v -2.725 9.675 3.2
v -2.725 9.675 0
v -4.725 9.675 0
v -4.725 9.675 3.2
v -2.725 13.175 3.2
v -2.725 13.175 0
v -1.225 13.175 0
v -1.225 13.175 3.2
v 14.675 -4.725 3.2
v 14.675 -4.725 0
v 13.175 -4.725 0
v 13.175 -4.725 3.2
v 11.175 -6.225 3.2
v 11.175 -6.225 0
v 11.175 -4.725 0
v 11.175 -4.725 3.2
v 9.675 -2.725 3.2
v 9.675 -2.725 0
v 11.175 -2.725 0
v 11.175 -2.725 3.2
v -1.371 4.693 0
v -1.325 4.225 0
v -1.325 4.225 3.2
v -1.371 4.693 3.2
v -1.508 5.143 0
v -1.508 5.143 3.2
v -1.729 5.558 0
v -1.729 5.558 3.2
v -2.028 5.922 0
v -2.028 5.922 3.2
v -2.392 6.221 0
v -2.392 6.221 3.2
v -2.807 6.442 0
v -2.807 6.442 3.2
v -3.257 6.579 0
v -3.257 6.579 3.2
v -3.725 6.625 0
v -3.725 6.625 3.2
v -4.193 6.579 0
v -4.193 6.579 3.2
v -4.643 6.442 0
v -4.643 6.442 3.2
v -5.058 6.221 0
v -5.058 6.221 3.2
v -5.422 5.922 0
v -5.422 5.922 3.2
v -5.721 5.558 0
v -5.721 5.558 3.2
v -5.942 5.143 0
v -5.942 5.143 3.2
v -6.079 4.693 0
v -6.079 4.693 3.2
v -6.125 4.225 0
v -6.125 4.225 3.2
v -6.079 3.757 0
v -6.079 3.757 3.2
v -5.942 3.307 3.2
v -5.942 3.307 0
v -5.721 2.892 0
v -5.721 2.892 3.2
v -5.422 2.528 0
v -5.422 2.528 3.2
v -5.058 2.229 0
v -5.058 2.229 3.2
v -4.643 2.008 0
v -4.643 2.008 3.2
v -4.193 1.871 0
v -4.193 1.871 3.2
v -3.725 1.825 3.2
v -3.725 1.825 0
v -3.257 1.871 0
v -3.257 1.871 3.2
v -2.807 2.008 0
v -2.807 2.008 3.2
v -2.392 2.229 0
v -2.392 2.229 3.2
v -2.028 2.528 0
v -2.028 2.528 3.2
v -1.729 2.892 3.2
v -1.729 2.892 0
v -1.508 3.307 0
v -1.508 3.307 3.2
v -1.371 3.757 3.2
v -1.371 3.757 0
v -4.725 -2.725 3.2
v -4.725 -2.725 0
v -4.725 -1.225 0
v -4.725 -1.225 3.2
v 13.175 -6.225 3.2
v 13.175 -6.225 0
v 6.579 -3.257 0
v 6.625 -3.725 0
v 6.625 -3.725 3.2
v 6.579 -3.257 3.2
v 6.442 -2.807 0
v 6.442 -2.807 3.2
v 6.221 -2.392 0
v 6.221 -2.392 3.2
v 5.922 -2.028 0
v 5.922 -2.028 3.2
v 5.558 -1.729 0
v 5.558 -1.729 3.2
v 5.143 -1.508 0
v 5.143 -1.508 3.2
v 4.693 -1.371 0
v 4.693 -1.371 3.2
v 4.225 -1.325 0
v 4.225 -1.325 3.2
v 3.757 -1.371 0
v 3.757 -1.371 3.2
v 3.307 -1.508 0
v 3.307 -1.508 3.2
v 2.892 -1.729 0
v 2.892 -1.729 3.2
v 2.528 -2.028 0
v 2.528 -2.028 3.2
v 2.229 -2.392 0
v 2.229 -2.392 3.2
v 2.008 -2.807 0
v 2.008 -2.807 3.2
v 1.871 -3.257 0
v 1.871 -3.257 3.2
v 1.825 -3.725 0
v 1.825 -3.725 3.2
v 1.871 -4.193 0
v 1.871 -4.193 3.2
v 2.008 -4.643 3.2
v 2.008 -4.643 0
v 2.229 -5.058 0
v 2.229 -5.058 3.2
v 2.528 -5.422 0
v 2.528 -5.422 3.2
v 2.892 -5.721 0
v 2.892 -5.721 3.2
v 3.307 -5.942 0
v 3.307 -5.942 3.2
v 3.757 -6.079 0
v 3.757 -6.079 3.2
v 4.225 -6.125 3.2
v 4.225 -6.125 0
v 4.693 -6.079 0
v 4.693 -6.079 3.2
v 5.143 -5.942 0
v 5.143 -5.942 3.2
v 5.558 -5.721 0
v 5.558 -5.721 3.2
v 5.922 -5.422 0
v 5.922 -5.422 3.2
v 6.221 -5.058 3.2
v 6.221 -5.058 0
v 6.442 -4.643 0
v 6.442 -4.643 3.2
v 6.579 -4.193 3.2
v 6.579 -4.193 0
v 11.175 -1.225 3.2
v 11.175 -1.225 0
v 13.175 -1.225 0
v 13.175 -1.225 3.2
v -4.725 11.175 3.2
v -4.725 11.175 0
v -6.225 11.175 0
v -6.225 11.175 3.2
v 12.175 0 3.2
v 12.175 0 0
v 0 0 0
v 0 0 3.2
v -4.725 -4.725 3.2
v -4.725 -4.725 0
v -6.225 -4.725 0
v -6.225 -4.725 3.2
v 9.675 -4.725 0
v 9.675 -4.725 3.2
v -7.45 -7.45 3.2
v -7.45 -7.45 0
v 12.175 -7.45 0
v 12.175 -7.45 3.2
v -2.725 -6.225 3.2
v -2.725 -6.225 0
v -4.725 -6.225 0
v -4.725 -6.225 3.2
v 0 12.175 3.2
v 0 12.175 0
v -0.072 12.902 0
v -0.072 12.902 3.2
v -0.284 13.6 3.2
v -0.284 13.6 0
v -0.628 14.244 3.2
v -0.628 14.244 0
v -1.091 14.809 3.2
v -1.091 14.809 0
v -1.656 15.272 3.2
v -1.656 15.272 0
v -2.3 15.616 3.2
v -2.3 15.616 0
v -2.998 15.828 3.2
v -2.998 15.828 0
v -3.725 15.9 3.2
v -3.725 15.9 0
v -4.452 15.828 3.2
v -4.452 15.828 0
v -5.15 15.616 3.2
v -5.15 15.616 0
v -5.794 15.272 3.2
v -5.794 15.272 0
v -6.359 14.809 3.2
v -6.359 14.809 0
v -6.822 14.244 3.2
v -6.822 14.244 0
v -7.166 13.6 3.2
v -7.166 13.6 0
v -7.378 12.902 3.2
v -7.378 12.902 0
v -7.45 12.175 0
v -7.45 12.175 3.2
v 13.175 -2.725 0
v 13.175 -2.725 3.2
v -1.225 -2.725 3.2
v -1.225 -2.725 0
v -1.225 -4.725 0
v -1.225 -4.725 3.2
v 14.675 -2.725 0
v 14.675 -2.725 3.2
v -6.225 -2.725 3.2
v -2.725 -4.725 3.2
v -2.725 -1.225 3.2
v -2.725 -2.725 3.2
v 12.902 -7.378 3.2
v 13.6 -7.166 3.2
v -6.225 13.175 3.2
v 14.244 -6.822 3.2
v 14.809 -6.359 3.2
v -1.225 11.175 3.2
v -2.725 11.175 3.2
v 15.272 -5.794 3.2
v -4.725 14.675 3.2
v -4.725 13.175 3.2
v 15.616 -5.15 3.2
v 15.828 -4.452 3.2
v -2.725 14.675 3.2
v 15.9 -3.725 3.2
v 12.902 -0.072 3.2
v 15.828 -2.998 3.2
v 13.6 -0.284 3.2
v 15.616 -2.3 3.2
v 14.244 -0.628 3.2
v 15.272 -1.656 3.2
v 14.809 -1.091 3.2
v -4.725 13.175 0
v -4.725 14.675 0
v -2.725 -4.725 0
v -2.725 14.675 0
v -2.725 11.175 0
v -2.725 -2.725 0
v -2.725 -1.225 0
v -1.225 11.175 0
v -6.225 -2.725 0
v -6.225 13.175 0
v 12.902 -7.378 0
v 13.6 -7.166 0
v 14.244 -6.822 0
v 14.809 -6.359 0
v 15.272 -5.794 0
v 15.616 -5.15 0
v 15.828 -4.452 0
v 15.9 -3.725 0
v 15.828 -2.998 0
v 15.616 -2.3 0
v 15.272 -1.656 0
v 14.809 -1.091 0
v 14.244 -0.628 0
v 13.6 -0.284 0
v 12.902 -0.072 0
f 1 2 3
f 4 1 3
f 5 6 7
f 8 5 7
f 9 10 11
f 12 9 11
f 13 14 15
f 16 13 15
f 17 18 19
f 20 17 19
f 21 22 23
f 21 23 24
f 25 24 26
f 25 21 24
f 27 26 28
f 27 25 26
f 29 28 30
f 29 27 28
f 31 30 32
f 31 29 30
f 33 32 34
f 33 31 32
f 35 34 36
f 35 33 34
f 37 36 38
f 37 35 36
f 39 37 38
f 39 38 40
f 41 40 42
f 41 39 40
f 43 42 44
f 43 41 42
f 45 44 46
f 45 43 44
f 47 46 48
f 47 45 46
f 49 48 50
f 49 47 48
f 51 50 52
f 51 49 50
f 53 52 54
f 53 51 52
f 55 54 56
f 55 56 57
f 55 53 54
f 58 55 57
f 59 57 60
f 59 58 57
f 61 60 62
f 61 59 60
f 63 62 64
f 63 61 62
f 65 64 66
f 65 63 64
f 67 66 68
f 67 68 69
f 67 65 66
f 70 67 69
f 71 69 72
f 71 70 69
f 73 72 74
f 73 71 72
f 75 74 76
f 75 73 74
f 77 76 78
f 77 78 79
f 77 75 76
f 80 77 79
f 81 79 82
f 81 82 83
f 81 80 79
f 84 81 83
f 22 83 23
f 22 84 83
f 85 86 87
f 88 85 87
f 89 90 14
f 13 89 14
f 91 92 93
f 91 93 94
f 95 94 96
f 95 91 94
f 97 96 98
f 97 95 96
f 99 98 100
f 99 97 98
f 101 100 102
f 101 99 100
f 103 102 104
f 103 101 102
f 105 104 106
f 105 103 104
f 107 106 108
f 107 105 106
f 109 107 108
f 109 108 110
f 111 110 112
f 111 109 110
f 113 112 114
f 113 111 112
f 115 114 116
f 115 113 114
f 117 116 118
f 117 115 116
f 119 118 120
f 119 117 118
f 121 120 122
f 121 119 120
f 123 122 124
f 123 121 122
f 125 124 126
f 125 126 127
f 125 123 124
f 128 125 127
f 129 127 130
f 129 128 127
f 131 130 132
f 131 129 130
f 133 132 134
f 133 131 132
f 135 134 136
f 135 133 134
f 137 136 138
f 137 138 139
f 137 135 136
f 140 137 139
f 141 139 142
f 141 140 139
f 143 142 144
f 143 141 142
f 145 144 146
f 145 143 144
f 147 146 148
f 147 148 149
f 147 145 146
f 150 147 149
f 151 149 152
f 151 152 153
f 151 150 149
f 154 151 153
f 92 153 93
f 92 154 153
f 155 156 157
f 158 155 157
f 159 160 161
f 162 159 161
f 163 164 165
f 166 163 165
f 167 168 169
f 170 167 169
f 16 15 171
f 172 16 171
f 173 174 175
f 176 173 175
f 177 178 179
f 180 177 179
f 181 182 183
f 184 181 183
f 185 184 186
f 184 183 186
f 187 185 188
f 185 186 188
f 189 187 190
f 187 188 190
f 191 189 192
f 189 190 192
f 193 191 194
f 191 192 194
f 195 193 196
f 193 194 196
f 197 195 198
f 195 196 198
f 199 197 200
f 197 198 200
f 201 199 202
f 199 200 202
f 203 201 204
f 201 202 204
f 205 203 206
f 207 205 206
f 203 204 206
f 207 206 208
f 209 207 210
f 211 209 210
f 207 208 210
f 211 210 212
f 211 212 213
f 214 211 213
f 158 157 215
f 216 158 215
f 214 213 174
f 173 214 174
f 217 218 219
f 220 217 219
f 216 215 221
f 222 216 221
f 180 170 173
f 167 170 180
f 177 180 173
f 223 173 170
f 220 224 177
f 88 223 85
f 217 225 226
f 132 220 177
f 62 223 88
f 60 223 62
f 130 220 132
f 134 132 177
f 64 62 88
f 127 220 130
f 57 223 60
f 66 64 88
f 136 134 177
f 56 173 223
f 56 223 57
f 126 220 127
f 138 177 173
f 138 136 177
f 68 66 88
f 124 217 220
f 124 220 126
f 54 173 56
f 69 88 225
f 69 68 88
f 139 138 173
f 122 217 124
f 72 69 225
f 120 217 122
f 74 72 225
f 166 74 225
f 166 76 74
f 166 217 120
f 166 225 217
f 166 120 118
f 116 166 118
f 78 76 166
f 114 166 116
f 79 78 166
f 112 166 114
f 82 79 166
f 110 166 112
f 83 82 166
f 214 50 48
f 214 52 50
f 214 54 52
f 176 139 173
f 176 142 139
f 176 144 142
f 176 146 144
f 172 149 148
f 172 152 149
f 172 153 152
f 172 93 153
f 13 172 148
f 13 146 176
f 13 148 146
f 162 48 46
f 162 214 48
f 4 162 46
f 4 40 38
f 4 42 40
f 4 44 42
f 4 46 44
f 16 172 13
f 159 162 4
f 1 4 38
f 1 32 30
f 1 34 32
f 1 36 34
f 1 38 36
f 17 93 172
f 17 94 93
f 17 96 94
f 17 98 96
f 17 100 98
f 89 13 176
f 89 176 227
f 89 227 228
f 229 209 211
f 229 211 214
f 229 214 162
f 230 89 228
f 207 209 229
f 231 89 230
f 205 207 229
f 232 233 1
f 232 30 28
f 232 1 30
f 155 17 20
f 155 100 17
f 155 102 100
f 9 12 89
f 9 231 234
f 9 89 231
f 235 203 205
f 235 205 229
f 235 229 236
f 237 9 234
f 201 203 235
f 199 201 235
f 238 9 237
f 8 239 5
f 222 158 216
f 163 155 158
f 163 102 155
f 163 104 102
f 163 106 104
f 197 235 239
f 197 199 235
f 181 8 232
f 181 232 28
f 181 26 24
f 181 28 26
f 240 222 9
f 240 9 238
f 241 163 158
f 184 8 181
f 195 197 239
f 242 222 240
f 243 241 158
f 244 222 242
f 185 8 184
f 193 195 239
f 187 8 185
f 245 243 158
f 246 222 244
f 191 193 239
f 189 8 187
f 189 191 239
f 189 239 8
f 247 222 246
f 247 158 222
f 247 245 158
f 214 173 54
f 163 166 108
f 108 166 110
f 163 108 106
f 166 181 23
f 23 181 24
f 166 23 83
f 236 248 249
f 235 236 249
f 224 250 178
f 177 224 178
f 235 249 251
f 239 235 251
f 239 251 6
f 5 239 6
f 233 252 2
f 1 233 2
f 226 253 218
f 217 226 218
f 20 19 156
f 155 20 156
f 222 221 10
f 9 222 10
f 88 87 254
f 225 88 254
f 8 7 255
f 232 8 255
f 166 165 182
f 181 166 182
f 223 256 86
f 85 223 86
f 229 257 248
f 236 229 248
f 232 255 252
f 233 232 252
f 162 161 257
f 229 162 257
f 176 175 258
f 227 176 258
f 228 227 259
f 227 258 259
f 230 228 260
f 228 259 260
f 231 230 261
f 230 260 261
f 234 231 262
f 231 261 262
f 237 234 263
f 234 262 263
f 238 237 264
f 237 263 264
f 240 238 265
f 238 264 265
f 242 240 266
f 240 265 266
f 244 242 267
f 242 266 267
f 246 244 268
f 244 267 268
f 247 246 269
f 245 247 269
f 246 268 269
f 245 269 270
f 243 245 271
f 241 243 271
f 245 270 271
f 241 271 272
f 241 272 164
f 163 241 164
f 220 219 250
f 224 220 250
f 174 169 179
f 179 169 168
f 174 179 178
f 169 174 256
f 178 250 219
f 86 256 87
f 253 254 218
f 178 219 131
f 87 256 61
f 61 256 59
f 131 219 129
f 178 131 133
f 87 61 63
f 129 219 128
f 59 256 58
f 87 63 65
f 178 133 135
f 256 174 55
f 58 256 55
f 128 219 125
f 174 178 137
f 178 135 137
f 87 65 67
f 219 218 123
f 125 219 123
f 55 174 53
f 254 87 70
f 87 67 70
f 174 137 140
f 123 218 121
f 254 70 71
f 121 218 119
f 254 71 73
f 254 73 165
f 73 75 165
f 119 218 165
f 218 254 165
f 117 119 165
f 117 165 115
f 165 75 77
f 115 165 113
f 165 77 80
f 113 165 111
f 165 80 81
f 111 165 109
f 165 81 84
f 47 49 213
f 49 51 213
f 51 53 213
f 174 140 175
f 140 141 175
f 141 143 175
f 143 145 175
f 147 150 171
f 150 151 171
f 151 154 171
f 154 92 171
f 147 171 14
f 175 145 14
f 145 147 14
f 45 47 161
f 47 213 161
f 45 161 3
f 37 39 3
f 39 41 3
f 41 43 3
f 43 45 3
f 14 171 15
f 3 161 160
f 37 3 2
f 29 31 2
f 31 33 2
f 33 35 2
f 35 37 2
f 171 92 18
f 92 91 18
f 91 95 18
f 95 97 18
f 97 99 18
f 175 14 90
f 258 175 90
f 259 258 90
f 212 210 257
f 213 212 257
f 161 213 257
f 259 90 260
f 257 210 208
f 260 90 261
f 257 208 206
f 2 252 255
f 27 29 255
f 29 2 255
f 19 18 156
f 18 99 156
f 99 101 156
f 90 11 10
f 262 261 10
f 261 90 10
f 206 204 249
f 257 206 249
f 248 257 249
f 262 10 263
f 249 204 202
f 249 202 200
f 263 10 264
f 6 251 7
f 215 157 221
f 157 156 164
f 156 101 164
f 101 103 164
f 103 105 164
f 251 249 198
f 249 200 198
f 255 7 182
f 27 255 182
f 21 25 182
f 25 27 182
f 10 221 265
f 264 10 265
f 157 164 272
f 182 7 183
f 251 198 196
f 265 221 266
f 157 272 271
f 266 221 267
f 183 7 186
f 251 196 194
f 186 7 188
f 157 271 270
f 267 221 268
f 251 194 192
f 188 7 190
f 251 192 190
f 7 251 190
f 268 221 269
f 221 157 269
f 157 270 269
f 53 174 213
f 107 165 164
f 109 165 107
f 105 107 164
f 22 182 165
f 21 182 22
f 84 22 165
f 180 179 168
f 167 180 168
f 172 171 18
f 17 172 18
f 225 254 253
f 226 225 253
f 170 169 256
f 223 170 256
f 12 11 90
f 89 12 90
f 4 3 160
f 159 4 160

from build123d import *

# Parameters (mm, degrees)
F0_R     = 2.4
F1_DEPTH = 3.2


with BuildPart() as f1:
    # F0 (on Top) → F1 (new body)
    with BuildSketch(Plane.XY):
        with BuildLine():
            ThreePointArc((0, 12.175), (-3.725, 15.9), (-7.45, 12.175))
            Line((-7.45, 12.175), (-7.45, -7.45))
            Line((-7.45, -7.45), (12.175, -7.45))
            ThreePointArc((12.175, -7.45), (15.9, -3.725), (12.175, 0))
            Line((12.175, 0), (0, 0))
            Line((0, 0), (0, 12.175))
        make_face()
        Polygon((-4.725, -2.725), (-4.725, -1.225), (-2.725, -1.225), (-2.725, -2.725), (-1.225, -2.725), (-1.225, -4.725), (-2.725, -4.725), (-2.725, -6.225), (-4.725, -6.225), (-4.725, -4.725), (-6.225, -4.725), (-6.225, -2.725), align=None, mode=Mode.SUBTRACT)
        with Locations((4.225, -3.725)):
            Circle(F0_R, mode=Mode.SUBTRACT)
        Polygon((11.175, -2.725), (11.175, -1.225), (13.175, -1.225), (13.175, -2.725), (14.675, -2.725), (14.675, -4.725), (13.175, -4.725), (13.175, -6.225), (11.175, -6.225), (11.175, -4.725), (9.675, -4.725), (9.675, -2.725), align=None, mode=Mode.SUBTRACT)
        with Locations((-3.725, 4.225)):
            Circle(F0_R, mode=Mode.SUBTRACT)
        Polygon((-4.725, 13.175), (-4.725, 14.675), (-2.725, 14.675), (-2.725, 13.175), (-1.225, 13.175), (-1.225, 11.175), (-2.725, 11.175), (-2.725, 9.675), (-4.725, 9.675), (-4.725, 11.175), (-6.225, 11.175), (-6.225, 13.175), align=None, mode=Mode.SUBTRACT)
    extrude(amount=F1_DEPTH)


solid = f1.part
